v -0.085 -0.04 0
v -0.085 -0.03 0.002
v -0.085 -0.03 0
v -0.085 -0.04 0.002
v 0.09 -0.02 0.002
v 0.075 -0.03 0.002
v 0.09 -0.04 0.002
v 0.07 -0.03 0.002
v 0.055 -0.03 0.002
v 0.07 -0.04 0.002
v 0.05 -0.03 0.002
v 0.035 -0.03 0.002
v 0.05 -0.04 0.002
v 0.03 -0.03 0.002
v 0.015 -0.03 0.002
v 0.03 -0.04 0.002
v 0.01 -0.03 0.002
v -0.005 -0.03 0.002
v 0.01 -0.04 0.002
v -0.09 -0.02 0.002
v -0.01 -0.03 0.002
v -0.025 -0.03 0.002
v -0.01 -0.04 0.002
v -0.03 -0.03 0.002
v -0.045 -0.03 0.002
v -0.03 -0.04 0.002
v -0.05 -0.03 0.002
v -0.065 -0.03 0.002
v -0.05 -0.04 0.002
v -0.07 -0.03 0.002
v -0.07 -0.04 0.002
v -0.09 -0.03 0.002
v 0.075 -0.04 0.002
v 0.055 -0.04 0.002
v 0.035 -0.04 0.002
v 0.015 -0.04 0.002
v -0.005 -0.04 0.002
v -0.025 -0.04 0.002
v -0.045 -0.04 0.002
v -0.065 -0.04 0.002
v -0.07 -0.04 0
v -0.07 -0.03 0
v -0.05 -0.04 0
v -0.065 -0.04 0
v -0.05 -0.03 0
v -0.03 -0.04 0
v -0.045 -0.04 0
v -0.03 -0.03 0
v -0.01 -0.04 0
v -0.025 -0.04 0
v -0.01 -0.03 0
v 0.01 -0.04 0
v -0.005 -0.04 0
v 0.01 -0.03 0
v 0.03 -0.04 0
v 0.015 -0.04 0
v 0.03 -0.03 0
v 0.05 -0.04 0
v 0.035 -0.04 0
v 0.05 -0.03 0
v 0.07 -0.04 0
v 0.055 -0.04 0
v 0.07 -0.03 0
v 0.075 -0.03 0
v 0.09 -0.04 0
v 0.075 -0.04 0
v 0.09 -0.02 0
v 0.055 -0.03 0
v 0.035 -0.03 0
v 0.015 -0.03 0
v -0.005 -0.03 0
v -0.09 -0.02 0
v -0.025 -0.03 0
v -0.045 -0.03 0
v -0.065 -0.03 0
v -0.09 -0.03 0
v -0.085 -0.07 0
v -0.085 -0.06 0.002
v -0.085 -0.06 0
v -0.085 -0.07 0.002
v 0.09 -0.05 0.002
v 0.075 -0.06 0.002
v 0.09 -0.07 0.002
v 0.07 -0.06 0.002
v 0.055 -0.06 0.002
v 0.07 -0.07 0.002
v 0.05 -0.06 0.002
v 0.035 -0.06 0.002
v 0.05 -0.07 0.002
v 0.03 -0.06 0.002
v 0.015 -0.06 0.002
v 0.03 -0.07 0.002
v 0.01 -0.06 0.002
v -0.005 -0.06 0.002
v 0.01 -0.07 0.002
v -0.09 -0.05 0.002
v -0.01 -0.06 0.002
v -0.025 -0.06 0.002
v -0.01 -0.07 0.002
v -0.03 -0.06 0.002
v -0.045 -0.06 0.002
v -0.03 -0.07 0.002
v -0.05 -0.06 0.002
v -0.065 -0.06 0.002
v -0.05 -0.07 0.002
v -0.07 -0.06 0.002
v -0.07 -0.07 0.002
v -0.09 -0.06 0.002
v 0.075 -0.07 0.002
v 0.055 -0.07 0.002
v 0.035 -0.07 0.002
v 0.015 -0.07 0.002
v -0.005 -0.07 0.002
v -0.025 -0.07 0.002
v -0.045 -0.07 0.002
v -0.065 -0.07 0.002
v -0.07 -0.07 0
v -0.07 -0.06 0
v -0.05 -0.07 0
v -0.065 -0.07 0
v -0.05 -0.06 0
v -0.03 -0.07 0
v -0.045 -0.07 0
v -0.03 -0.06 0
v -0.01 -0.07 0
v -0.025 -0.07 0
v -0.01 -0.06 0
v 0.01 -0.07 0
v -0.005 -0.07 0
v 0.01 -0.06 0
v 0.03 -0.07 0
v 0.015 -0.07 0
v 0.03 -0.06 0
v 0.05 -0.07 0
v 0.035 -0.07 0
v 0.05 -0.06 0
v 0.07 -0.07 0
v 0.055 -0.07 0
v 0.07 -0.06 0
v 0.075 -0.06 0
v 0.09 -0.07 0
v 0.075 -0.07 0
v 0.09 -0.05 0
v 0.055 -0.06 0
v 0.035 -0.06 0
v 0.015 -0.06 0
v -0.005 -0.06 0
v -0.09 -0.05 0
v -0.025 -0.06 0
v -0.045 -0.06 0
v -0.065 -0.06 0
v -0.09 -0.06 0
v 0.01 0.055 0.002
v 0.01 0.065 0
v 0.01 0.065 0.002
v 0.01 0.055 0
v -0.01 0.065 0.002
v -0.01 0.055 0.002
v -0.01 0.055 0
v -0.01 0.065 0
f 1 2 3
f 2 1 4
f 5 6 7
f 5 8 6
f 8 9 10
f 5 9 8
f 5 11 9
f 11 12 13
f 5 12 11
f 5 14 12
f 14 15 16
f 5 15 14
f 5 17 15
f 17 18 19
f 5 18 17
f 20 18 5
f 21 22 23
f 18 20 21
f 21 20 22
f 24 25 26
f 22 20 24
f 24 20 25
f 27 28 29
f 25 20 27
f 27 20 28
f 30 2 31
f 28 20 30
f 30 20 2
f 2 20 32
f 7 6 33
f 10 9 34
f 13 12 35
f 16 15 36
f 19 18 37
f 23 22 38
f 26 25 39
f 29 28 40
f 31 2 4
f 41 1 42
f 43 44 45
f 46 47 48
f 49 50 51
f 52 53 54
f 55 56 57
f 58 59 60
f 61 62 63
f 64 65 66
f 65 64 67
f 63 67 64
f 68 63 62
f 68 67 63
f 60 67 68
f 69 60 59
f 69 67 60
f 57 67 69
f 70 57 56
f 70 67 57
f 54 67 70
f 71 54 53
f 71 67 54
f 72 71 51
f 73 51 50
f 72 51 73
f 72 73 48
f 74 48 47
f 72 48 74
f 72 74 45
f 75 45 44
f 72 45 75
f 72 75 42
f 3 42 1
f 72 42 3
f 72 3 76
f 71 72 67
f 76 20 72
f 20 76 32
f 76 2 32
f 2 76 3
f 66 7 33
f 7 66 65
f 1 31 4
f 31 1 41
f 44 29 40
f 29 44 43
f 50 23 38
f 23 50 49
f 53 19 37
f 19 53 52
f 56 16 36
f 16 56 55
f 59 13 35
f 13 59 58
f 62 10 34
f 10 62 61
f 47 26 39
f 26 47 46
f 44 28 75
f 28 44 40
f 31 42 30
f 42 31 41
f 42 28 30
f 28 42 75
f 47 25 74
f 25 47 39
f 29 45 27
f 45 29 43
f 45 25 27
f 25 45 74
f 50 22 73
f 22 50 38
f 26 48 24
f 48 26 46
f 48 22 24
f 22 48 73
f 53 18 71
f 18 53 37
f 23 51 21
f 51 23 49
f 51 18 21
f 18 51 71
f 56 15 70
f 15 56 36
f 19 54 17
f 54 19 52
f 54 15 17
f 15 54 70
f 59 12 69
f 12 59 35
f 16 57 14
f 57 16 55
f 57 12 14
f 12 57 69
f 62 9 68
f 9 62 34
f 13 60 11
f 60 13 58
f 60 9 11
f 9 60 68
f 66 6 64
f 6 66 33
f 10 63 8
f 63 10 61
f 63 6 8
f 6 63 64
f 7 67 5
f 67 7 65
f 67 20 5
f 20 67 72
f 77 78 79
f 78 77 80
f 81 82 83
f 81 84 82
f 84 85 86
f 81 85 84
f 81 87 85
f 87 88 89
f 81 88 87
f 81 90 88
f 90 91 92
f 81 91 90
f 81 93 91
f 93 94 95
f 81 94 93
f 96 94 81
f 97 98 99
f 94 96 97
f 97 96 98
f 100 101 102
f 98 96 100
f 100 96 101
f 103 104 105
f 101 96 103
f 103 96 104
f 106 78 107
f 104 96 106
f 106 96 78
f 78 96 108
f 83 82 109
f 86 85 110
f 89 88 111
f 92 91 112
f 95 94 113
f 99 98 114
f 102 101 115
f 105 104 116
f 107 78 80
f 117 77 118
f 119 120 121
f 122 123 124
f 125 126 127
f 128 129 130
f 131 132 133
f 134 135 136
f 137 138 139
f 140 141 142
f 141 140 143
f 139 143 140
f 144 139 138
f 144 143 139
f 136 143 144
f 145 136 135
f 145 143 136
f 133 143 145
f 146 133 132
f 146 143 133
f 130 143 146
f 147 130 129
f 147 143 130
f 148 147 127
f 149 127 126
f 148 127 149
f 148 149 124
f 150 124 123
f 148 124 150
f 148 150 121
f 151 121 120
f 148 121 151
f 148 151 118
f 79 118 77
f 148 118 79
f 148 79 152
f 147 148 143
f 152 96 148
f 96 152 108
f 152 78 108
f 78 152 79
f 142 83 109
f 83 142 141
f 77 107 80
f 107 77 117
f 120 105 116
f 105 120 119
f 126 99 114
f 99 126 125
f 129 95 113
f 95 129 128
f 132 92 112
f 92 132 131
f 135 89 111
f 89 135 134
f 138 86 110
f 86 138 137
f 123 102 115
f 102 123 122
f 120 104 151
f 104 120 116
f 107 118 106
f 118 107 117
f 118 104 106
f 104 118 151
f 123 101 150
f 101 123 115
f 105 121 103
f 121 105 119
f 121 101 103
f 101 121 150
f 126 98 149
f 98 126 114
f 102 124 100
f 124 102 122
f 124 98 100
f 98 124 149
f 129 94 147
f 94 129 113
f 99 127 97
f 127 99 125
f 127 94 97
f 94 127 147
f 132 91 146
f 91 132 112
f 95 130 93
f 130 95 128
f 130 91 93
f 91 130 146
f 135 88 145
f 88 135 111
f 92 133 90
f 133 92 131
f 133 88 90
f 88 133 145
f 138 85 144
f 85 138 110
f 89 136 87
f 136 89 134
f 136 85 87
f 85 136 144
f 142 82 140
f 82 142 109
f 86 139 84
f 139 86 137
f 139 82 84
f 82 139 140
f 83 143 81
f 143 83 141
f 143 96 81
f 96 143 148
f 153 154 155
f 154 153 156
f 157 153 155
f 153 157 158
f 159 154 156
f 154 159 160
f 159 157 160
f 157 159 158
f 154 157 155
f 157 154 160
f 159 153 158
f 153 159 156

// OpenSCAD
module chamfered_plate(length, width, thickness, chamfer, hole_positions) {
    difference() {
        hull() {
            translate([-length/2 + chamfer, -width/2, 0])
                square([length - 2*chamfer, width], center=false);
            translate([-length/2, -width/2 + chamfer, 0])
                square([length, width - 2*chamfer], center=false);
        }
        for (pos = hole_positions) {
            translate([pos[0], pos[1], 0])
                rotate(45) square([2, 2], center=true);
        }
    }
}

module notched_strip(length, width, thickness, notch_width, notch_depth, notch_spacing) {
    difference() {
        translate([-length/2, -width/2, 0])
            cube([length, width, thickness], center=false);
        for (i = [0 : floor(length / notch_spacing) - 1]) {
            translate([-length/2 + i * notch_spacing, -width/2, 0])
                cube([notch_width, notch_depth, thickness], center=false);
        }
    }
}

module i_beam(length, width, height, flange_width, web_thickness) {
    union() {
        translate([-length/2, -flange_width/2, 0])
            cube([length, flange_width, height], center=false);
        translate([-length/2, -web_thickness/2, height/2 - web_thickness/2])
            cube([length, web_thickness, height - web_thickness], center=false);
    }
}

module assembly() {
    chamfered_plate(0.18, 0.02, 0.002, 0.005, [[-0.06, 0], [0, 0], [0.06, 0]]);
    translate([0, 0.03, 0])
        chamfered_plate(0.18, 0.02, 0.002, 0.005, [[-0.06, 0], [0, 0], [0.06, 0]]);
    translate([0, -0.03, 0])
        notched_strip(0.18, 0.02, 0.002, 0.005, 0.01, 0.02);
    translate([0, -0.06, 0])
        notched_strip(0.18, 0.02, 0.002, 0.005, 0.01, 0.02);
    translate([0, 0.06, 0])
        i_beam(0.02, 0.01, 0.002, 0.01, 0.002);
}

assembly();
